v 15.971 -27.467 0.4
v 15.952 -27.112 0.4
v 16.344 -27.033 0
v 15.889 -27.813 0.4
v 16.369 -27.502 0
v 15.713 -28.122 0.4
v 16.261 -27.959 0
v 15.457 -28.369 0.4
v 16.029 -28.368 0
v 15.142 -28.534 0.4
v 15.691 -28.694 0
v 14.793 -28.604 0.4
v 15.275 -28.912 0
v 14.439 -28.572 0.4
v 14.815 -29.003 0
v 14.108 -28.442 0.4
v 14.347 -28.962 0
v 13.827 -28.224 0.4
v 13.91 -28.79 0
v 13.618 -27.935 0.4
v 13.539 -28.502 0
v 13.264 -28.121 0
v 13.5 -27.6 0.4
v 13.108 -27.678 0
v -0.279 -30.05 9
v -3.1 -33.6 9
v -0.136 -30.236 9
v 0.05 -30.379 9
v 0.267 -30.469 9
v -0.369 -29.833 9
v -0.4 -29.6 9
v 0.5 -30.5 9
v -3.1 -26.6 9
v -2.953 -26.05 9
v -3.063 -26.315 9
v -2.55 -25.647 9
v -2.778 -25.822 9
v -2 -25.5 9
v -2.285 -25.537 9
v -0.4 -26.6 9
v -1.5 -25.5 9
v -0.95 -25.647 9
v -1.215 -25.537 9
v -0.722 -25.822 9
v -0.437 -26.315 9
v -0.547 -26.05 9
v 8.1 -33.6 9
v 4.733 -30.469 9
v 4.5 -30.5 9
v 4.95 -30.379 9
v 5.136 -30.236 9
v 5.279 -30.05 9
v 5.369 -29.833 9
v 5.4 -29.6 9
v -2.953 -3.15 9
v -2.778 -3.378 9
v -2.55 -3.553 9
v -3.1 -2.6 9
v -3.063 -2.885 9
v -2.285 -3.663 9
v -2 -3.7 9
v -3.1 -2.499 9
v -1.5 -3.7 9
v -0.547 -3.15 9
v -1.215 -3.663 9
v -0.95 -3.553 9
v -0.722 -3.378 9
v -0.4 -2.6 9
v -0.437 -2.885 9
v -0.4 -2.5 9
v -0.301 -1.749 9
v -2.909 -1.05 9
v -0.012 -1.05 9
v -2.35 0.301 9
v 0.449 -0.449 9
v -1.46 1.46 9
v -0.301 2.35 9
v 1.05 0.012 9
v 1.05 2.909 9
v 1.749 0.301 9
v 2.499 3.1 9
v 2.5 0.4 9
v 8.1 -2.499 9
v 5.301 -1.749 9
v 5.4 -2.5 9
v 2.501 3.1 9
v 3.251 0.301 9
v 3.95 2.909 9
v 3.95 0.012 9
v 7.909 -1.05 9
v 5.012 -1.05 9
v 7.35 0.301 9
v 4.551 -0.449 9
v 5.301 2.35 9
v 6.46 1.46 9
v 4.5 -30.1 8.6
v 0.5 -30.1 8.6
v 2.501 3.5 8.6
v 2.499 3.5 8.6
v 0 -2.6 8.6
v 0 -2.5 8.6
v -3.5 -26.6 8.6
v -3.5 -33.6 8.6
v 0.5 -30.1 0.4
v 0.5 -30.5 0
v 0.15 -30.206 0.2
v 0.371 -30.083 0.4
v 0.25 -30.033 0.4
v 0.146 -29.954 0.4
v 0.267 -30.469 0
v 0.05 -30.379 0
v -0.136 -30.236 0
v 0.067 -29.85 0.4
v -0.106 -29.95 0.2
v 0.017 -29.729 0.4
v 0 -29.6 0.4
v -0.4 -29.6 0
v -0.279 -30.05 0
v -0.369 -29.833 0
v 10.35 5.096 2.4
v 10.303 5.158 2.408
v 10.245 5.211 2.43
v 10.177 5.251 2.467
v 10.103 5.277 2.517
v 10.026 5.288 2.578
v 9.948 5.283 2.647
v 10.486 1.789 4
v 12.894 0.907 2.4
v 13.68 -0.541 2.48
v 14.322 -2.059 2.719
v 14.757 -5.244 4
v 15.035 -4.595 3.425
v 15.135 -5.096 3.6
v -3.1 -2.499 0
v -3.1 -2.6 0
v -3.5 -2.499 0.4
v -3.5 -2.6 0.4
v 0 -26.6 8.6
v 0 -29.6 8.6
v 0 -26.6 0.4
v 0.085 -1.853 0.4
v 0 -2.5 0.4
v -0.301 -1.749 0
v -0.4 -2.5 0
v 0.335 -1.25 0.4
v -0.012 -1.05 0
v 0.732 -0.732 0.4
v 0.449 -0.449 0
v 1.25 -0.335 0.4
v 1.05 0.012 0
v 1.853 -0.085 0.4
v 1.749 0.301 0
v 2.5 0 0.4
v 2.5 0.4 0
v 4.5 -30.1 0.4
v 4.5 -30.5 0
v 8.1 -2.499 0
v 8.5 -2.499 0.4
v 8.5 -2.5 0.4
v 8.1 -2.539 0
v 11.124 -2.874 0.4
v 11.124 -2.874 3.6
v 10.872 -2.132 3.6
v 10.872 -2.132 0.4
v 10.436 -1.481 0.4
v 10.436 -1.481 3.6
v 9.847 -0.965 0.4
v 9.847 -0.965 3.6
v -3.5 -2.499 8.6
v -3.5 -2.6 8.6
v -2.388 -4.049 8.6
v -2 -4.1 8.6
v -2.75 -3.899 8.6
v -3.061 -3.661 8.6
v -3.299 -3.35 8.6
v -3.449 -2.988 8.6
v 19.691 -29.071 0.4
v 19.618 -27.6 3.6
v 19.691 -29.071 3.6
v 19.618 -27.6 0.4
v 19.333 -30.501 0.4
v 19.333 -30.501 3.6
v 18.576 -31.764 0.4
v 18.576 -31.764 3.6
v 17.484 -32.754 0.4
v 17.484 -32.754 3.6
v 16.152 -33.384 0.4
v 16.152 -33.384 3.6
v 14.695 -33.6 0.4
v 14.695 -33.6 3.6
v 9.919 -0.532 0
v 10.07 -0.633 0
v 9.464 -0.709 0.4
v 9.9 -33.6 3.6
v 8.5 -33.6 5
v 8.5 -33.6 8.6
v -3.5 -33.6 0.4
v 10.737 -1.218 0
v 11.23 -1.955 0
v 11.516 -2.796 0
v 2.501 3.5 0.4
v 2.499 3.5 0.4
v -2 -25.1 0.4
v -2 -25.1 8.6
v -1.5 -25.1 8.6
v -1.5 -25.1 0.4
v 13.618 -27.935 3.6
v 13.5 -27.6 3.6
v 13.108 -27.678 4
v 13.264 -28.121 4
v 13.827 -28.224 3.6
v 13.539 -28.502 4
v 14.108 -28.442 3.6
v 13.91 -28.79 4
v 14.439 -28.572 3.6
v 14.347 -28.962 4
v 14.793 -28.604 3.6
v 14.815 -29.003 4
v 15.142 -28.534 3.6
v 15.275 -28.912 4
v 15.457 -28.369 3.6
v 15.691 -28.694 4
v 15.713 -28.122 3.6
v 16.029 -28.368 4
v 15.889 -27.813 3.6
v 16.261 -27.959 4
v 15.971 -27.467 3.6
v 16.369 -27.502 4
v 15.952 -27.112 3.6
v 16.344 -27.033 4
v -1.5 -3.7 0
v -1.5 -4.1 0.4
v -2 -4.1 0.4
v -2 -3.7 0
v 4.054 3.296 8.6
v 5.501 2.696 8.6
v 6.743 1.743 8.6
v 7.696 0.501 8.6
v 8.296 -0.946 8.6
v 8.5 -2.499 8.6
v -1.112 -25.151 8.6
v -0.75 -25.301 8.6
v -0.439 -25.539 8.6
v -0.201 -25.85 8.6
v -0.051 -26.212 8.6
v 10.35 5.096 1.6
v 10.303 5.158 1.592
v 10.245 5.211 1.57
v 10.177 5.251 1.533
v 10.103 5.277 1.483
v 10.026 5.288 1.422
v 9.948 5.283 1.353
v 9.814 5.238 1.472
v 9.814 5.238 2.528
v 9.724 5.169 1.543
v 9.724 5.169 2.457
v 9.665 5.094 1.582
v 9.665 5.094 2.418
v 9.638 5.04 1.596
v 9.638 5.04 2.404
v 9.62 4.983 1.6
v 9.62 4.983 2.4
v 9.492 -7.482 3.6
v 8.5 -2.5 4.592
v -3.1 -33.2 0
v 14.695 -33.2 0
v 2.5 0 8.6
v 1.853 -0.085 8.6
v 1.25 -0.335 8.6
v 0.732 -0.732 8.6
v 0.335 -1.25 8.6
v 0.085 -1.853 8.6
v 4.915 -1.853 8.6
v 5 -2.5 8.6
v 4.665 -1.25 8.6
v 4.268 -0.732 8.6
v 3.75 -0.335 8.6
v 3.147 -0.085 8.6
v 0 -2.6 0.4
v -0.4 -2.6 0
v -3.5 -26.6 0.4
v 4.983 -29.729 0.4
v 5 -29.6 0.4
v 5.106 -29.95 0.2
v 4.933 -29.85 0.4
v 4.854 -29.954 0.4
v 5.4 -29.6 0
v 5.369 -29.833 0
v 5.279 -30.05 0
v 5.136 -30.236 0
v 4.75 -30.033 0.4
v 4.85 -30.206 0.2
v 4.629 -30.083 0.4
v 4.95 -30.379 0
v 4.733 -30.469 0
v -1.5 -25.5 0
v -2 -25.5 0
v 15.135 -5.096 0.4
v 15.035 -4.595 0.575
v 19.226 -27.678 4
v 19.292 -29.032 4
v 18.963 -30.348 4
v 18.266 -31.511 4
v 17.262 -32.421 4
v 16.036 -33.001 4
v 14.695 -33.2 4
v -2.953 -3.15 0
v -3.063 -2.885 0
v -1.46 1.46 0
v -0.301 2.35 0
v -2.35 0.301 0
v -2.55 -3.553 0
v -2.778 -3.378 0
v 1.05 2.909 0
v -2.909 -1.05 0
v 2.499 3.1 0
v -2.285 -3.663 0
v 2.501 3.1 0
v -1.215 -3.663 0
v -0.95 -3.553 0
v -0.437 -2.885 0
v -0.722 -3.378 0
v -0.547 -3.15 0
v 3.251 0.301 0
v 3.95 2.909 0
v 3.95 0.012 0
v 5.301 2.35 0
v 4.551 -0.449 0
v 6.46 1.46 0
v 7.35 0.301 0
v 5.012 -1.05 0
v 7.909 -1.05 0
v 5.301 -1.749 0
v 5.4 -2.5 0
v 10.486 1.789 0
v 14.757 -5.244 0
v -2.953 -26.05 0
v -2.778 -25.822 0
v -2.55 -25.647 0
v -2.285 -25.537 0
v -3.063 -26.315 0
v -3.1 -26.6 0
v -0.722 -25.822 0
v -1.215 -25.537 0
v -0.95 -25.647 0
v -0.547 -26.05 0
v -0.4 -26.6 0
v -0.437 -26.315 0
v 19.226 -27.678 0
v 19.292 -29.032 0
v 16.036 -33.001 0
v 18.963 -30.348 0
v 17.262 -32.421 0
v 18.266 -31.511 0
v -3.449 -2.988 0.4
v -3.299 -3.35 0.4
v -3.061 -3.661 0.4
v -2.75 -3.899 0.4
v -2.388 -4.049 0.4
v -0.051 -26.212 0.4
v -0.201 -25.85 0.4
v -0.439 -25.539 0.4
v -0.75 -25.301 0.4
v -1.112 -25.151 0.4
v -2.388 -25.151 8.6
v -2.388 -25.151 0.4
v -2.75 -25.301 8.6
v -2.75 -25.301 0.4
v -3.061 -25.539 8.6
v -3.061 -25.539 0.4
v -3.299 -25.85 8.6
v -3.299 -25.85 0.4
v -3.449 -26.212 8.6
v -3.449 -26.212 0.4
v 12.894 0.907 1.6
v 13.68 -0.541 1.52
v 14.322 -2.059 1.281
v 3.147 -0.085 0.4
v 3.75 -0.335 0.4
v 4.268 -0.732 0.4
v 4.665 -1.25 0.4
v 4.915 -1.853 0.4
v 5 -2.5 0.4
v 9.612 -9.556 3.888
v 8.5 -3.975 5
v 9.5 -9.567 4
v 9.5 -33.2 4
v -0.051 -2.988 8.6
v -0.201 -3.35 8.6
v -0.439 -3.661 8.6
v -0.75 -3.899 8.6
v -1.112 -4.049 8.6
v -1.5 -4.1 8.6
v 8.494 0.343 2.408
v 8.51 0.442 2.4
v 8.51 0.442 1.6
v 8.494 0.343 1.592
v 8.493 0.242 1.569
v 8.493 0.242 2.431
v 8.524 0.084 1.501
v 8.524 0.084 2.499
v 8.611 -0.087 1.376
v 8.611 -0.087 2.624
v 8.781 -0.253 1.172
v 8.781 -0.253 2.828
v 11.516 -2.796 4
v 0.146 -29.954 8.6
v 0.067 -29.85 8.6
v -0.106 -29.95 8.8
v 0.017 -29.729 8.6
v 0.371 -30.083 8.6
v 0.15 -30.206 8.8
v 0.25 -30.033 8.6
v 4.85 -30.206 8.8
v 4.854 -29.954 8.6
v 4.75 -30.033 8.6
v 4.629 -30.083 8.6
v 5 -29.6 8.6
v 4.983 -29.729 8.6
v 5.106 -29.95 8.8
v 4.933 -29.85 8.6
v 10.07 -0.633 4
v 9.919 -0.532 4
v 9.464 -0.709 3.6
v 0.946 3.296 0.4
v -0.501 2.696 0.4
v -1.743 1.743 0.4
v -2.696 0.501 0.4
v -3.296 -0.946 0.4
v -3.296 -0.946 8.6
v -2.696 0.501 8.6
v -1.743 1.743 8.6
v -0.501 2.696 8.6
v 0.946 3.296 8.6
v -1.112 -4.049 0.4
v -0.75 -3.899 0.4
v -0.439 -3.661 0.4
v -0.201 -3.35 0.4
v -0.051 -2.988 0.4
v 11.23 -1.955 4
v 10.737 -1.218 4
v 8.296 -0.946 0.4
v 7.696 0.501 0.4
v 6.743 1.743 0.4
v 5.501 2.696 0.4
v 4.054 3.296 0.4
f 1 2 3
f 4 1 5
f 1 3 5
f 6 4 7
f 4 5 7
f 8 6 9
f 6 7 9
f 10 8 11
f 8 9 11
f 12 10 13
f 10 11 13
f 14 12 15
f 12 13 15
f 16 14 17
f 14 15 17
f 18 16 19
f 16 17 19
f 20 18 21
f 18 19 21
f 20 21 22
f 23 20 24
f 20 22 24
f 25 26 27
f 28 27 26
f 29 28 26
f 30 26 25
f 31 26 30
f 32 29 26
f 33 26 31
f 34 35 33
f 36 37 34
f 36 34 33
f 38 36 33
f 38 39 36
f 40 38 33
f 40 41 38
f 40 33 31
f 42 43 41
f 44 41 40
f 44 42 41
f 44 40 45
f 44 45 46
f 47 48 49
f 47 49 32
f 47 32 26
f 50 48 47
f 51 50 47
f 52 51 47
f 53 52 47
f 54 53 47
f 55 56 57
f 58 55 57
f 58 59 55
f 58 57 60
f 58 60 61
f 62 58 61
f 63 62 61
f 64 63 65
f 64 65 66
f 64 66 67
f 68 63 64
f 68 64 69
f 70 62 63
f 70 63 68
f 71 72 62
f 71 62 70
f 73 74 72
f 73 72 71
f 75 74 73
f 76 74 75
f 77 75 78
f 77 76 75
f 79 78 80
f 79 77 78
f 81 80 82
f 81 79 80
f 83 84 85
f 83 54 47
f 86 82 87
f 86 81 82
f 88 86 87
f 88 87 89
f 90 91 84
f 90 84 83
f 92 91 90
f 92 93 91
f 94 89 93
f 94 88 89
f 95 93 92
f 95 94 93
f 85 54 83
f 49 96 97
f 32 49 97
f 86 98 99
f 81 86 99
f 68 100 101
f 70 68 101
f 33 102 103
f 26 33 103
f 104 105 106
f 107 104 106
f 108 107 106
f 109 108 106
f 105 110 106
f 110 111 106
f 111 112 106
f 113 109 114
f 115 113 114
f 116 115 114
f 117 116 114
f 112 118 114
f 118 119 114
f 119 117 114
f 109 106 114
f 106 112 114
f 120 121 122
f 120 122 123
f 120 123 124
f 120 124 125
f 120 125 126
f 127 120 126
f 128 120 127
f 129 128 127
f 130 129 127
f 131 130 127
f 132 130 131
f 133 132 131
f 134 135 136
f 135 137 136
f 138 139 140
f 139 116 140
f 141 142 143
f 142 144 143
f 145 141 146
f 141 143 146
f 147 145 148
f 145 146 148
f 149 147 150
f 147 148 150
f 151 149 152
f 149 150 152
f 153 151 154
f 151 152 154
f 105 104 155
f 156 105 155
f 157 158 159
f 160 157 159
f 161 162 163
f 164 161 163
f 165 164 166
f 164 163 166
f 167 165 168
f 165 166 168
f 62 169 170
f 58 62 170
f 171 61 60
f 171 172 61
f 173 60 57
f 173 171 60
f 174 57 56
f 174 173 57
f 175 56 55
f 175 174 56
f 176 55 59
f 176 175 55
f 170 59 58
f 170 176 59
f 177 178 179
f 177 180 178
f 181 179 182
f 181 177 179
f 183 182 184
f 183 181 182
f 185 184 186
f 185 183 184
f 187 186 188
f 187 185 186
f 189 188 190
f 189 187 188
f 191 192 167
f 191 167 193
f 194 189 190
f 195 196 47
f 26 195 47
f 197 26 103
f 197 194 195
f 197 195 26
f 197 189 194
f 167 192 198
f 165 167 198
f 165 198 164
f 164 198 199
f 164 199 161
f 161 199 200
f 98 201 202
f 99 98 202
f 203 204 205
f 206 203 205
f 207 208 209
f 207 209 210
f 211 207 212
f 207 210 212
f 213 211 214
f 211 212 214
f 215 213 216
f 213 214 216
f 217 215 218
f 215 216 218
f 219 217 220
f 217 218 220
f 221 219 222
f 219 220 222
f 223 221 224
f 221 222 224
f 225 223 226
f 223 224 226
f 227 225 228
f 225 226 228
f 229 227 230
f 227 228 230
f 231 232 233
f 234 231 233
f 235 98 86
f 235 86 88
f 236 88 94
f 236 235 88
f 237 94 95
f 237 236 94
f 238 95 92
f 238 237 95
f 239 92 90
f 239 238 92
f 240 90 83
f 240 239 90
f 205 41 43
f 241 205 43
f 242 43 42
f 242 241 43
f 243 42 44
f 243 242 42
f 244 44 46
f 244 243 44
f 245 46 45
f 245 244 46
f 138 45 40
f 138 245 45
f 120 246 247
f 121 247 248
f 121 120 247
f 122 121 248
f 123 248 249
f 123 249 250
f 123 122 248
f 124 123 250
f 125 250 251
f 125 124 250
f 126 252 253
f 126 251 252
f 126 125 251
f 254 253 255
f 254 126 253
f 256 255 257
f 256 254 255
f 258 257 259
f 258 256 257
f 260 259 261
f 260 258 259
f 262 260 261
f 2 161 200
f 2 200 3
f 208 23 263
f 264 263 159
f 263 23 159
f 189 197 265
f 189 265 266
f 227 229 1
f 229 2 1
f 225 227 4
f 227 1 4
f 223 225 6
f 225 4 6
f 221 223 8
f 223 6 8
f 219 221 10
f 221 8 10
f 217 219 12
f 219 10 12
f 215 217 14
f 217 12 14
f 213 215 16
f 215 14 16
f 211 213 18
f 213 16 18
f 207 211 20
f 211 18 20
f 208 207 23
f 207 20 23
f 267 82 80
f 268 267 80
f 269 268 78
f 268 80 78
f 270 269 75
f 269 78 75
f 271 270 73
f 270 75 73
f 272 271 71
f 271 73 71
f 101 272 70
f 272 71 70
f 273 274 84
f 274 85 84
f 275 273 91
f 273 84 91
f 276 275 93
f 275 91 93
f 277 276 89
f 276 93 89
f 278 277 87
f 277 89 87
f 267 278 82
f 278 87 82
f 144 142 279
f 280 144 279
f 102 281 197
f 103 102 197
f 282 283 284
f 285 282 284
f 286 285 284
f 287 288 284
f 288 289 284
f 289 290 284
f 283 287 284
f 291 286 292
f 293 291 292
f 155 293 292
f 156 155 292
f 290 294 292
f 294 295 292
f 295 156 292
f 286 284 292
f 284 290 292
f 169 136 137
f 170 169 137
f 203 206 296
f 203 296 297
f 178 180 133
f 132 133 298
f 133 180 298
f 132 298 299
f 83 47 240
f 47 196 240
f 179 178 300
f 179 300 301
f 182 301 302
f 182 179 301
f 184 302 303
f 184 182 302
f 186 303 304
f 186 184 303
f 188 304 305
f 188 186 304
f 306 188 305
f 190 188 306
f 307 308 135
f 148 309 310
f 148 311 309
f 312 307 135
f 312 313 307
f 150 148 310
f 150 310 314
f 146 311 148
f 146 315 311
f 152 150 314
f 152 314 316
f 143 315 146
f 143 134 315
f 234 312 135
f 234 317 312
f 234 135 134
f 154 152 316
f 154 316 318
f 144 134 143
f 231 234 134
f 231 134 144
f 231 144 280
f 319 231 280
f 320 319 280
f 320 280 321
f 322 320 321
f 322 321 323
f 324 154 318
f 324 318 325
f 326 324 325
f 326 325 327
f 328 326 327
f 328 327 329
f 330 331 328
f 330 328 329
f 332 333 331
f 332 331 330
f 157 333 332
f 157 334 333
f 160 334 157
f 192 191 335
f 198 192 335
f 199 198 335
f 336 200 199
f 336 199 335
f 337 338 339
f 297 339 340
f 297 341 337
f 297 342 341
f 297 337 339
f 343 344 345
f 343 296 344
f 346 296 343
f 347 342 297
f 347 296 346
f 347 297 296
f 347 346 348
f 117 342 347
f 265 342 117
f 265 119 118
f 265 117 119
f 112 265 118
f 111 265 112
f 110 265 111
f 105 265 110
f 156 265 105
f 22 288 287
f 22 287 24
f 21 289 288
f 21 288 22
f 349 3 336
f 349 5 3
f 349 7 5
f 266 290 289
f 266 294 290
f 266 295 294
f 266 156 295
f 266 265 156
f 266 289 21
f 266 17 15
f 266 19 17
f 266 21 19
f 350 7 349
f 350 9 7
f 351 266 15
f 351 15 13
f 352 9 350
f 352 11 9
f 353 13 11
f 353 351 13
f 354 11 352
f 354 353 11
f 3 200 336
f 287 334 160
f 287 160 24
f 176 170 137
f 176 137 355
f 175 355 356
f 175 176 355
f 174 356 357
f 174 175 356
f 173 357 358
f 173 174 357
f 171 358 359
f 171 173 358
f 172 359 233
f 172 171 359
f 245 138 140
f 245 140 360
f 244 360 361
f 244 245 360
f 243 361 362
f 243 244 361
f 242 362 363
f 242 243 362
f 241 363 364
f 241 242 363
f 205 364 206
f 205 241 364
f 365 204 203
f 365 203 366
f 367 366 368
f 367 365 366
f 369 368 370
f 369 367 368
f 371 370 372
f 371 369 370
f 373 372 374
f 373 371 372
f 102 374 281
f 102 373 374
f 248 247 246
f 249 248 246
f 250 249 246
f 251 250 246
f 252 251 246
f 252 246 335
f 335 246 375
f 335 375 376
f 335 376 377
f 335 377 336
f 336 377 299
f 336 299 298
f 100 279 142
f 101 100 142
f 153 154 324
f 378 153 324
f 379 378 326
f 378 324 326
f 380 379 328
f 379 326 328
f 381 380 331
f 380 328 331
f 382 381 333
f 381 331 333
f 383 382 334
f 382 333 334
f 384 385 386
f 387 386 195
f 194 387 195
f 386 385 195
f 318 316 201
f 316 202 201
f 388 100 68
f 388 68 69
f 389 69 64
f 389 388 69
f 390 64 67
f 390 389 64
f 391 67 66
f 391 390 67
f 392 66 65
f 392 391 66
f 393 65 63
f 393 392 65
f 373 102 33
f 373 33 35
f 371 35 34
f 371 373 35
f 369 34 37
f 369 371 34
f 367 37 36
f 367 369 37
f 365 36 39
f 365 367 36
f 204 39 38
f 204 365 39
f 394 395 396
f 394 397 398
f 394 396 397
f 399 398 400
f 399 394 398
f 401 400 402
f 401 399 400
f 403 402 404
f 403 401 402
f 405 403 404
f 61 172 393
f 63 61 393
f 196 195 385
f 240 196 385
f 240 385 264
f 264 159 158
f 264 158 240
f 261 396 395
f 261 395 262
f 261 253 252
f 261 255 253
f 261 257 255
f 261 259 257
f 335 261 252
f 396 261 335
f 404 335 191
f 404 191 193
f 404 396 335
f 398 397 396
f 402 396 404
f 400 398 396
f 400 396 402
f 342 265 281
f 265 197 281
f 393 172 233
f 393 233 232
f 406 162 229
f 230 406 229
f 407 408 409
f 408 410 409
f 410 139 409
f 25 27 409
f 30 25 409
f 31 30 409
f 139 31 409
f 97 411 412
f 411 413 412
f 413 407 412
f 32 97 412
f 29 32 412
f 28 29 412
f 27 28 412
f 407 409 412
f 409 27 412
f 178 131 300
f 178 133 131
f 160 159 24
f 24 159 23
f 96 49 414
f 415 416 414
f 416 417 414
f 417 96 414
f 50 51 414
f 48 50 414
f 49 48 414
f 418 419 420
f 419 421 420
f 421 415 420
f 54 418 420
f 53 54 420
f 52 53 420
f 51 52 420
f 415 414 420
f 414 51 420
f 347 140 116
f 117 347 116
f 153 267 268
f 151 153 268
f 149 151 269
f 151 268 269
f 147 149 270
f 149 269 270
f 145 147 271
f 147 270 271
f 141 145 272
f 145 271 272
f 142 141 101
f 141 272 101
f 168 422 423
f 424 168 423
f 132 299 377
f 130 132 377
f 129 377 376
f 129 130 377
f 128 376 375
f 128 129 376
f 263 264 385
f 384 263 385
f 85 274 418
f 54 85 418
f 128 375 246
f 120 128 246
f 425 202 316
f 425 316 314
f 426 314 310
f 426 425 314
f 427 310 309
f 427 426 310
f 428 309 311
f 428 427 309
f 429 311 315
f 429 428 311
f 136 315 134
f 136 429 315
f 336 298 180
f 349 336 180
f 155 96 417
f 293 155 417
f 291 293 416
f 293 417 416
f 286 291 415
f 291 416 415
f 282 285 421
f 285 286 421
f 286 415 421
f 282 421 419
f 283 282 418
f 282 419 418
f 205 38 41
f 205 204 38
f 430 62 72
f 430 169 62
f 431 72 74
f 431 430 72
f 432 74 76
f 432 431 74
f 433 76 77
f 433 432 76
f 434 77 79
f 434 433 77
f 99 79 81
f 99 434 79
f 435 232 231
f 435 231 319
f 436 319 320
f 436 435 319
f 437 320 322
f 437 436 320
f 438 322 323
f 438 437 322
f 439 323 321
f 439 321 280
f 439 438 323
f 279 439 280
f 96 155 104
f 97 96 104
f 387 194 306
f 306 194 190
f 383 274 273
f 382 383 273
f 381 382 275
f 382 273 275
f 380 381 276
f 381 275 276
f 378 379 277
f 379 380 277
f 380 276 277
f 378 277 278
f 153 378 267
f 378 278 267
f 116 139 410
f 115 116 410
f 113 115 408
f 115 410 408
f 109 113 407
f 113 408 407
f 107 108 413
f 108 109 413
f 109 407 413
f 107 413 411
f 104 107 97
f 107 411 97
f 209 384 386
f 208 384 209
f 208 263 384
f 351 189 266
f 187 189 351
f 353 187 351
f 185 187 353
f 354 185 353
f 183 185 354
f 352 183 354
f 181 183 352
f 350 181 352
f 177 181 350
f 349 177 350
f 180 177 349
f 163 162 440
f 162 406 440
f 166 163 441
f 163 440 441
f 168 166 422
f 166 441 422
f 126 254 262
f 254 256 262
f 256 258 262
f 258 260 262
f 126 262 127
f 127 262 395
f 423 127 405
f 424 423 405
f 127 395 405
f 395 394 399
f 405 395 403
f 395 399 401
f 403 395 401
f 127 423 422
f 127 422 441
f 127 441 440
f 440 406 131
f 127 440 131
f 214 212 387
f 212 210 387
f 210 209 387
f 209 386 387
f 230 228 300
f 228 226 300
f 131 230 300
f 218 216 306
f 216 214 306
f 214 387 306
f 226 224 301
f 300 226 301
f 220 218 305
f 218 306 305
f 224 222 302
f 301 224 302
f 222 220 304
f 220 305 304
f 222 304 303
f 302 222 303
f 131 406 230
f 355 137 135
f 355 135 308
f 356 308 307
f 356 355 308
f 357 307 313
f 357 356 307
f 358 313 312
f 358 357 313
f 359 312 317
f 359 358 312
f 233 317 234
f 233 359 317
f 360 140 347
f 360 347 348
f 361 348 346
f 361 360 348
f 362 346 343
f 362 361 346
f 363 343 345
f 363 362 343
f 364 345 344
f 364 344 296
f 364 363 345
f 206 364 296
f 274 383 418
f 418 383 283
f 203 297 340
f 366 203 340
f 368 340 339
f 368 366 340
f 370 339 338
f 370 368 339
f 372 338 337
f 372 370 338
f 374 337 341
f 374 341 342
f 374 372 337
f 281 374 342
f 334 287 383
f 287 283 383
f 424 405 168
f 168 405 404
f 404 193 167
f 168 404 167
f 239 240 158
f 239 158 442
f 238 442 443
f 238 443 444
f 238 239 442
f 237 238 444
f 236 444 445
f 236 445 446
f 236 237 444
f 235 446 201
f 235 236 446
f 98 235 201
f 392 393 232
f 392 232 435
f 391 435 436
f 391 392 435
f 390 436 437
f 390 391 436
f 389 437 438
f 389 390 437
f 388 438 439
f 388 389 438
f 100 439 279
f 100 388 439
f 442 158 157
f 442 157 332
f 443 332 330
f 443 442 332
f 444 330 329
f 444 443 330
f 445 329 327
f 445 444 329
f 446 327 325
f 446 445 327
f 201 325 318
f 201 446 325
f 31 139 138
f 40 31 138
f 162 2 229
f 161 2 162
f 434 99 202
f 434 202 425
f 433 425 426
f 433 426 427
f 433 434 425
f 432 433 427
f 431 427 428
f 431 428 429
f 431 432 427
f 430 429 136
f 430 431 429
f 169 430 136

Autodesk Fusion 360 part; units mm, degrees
sketch "Sketch2" plane through (0, 0, 0) normal (0, 0, 1) x (1, 0, 0)
  line L0 (0, 0) -> (5, 0)
  line L1 (5, 0) -> (5, -30.1)
  line L2 (5, -30.1) -> (0, -30.1)
  line L3 (0, -30.1) -> (0, 0)
  line L4 (-3.5, -33.6) -> (8.5, -33.6)
  line L5 (8.5, -33.6) -> (8.5, 3.5)
  line L6 (8.5, 3.5) -> (-3.5, 3.5)
  line L7 (-3.5, 3.5) -> (-3.5, -33.6)
  line L8 (-3.5, -25.1) -> (0, -25.1)
  line L9 (-3.5, -4.1) -> (0, -4.1)
  dimension "d12" = 30.1
  dimension "d13" = 5
  dimension "d22" = 3.5
  dimension "d23" = 3.5
  dimension "d24" = 3.5
  dimension "d25" = 3.5
  dimension "d26" = 21
  dimension "d27" = 5
extrude "Extrude1" add sketch "Sketch2" along normal blind 9 contours L0 L1 L2 L3 L4 L5 L6 L7 L8 L9
fillet "Fillet1" radius 2.5 2 edges at (5, 0, 4.5) (0, 0, 4.5)
fillet "Fillet1" radius 6 2 edges at (8.5, 3.5, 4.5) (-3.5, 3.5, 4.5)
fillet "Fillet1" radius 1.5 4 edges at (0, -4.1, 4.5) (-3.5, -4.1, 4.5) (0, -25.1, 4.5) (-3.5, -25.1, 4.5)
fillet "Fillet1" radius 0.5 2 edges at (0, -30.1, 4.5) (5, -30.1, 4.5)
sketch "Sketch3" plane through (0, 0, 0) normal (0, 0, -1) x (1, 0, 0)
  arc A0 (-3.5, 26.6) -> (-2, 25.1) centre (-2, 26.6) ccw
  line L0 (-2, 25.1) -> (-1.5, 25.1)
  arc A1 (-1.5, 25.1) -> (0, 26.6) centre (-1.5, 26.6) ccw
  line L1 (0, 26.6) -> (0, 29.6)
  line L2 (0.5, 30.1) -> (4.5, 30.1)
  line L3 (5, 29.6) -> (5, 2.5)
  arc A2 (0, 2.5) -> (5, 2.5) centre (2.5, 2.5) ccw
  line L4 (0, 2.5) -> (0, 2.6)
  arc A3 (0, 2.6) -> (-1.5, 4.1) centre (-1.5, 2.6) ccw
  line L5 (-1.5, 4.1) -> (-2, 4.1)
  arc A4 (-2, 4.1) -> (-3.5, 2.6) centre (-2, 2.6) ccw
  line L6 (-3.5, 2.6) -> (-3.5, 2.5)
  arc A5 (-3.5, 2.5) -> (8.5, 2.5) centre (2.5, 2.5) ccw
  line L7 (8.5, 2.5) -> (8.5, 33.6)
  line L8 (8.5, 33.6) -> (-3.5, 33.6)
  line L9 (-3.5, 33.6) -> (-3.5, 26.6)
  line L10 (8.5, 27.6) -> (16.0491, 27.6) construction
  line L11 (13.5, 27.6) -> (8.5, 2.5)
  line L12 (16.0491, 27.6) -> (10.5511, 0)
  line L13 (0, 0) -> (10.5511, 0) construction
  line L14 (19.6179, 27.6) -> (14.4496, 1.6553)
  line L15 (8.402, 0) -> (9.8492, -5.9212)
  line L16 (8.402, 0) -> (10.8809, 1.6553)
  line L17 (14.4496, 1.6553) -> (9.8492, -5.9212)
  line L18 (14.4496, 1.6553) -> (10.8809, 1.6553) construction
  arc A6 (19.6179, 27.6) -> (14.6952, 33.6) centre (14.6952, 28.5806) ccw
  line L19 (14.6952, 33.6) -> (8.5, 33.6)
  line L20 (8.5, 2.5) -> (8.002, 0)
  line L21 (19.6179, 27.6) -> (16.0491, 27.6) construction
  circle A7 centre (14.7259, 27.3558) radius 1.25
  arc A8 (0.5, 30.1) -> (0, 29.6) centre (0.5, 29.6) ccw
  arc A9 (5, 29.6) -> (4.5, 30.1) centre (4.5, 29.6) ccw
  dimension "d36" = 2.5
  dimension "d37" = 2.5
  dimension "d38" = 5
  dimension "d39" = 3.5
  dimension "d40" = 45
  dimension "d41" = 110
  dimension "d44" = 20
  dimension "d45" = 0.4
extrude "Extrude2" add sketch "Sketch3" against normal blind 4 contours L7 L11 L12 L14 L15 L16 L17 A6 L19 A7
chamfer "Chamfer1" distance 1 angle 45 1 edges at (8.5, -18.05, 4)
chamfer "Chamfer4" distance 1.6 angle 45 4 edges at (9.1256, 2.9606, 4) (12.1494, 2.133, 4) (12.1494, 2.133, 0) (9.1256, 2.9606, 0)
fillet "Fillet3" radius 0.4 1 edges at (9.8492, 5.9212, 2)
fillet "Fillet3" radius 17 1 edges at (14.4496, -1.6553, 2)
fillet "Fillet3" radius 3 1 edges at (10.8809, -1.6553, 2)
fillet "Fillet3" radius 0.65 1 edges at (8.402, 0, 2)
chamfer "Chamfer5" distance 0.4 angle 45 9 edges at (18.5757, -31.7643, 4) (17.4907, -16.9216, 4) (12.0976, -33.6, 4) (11.5, -17.56, 4) (9.8327, -0.9554, 4) (10.6754, -1.7927, 4) (13.5377, -14.9928, 4) (14.9701, -28.5817, 4) (9, -5.01, 4.5)
chamfer "Chamfer5" distance 0.4 angle 45 24 edges at (17.4907, -16.9216, 0) (5.5976, -33.6, 0) (18.5757, -31.7643, 0) (-3.5, -30.1, 0) (2.5, 3.5, 0) (-3.5, -2.55, 0) (-3.0607, -3.6607, 0) (-1.75, -4.1, 0) (-0.4393, -3.6607, 0) (0, -2.55, 0) (2.5, 0, 0) (5, -16.05, 0) (4.8536, -29.9536, 0) (2.5, -30.1, 0) (0.1464, -29.9536, 0) (0, -28.1, 0) (-0.4393, -25.5393, 0) (-1.75, -25.1, 0) (-3.0607, -25.5393, 0) (11, -15.05, 0) (9.8327, -0.9554, 0) (10.6754, -1.7927, 0) (13.5377, -14.9928, 0) (14.9701, -28.5817, 0)
chamfer "Chamfer5" distance 0.4 angle 45 17 edges at (2.5, 0, 9) (0, -2.55, 9) (-0.4393, -3.6607, 9) (-1.75, -4.1, 9) (-3.0607, -3.6607, 9) (-3.5, -2.55, 9) (2.5, 3.5, 9) (8.5, -18.05, 9) (-3.5, -30.1, 9) (-3.0607, -25.5393, 9) (-1.75, -25.1, 9) (-0.4393, -25.5393, 9) (0, -28.1, 9) (0.1464, -29.9536, 9) (2.5, -30.1, 9) (4.8536, -29.9536, 9) (5, -16.05, 9)
equation "slot_height = 30.1 mm"
equation "slot_width = 5 mm"
equation "hook_offset = 2.5 mm"
equation "hook_slot = 2.5 mm"
equation "track_gap = 21 mm"
equation "body_width = 3.5 mm"
equation "d22 = body_width"
equation "d23 = body_width"
equation "d24 = body_width"
equation "d25 = body_width"
equation "d26 = track_gap"
equation "d36 = hook_offset"
equation "d37 = hook_slot"
equation "d39 = body_width"
equation "d40 = 45 °"
equation "d41 = 110 °"
equation "d44 = 20 °"
